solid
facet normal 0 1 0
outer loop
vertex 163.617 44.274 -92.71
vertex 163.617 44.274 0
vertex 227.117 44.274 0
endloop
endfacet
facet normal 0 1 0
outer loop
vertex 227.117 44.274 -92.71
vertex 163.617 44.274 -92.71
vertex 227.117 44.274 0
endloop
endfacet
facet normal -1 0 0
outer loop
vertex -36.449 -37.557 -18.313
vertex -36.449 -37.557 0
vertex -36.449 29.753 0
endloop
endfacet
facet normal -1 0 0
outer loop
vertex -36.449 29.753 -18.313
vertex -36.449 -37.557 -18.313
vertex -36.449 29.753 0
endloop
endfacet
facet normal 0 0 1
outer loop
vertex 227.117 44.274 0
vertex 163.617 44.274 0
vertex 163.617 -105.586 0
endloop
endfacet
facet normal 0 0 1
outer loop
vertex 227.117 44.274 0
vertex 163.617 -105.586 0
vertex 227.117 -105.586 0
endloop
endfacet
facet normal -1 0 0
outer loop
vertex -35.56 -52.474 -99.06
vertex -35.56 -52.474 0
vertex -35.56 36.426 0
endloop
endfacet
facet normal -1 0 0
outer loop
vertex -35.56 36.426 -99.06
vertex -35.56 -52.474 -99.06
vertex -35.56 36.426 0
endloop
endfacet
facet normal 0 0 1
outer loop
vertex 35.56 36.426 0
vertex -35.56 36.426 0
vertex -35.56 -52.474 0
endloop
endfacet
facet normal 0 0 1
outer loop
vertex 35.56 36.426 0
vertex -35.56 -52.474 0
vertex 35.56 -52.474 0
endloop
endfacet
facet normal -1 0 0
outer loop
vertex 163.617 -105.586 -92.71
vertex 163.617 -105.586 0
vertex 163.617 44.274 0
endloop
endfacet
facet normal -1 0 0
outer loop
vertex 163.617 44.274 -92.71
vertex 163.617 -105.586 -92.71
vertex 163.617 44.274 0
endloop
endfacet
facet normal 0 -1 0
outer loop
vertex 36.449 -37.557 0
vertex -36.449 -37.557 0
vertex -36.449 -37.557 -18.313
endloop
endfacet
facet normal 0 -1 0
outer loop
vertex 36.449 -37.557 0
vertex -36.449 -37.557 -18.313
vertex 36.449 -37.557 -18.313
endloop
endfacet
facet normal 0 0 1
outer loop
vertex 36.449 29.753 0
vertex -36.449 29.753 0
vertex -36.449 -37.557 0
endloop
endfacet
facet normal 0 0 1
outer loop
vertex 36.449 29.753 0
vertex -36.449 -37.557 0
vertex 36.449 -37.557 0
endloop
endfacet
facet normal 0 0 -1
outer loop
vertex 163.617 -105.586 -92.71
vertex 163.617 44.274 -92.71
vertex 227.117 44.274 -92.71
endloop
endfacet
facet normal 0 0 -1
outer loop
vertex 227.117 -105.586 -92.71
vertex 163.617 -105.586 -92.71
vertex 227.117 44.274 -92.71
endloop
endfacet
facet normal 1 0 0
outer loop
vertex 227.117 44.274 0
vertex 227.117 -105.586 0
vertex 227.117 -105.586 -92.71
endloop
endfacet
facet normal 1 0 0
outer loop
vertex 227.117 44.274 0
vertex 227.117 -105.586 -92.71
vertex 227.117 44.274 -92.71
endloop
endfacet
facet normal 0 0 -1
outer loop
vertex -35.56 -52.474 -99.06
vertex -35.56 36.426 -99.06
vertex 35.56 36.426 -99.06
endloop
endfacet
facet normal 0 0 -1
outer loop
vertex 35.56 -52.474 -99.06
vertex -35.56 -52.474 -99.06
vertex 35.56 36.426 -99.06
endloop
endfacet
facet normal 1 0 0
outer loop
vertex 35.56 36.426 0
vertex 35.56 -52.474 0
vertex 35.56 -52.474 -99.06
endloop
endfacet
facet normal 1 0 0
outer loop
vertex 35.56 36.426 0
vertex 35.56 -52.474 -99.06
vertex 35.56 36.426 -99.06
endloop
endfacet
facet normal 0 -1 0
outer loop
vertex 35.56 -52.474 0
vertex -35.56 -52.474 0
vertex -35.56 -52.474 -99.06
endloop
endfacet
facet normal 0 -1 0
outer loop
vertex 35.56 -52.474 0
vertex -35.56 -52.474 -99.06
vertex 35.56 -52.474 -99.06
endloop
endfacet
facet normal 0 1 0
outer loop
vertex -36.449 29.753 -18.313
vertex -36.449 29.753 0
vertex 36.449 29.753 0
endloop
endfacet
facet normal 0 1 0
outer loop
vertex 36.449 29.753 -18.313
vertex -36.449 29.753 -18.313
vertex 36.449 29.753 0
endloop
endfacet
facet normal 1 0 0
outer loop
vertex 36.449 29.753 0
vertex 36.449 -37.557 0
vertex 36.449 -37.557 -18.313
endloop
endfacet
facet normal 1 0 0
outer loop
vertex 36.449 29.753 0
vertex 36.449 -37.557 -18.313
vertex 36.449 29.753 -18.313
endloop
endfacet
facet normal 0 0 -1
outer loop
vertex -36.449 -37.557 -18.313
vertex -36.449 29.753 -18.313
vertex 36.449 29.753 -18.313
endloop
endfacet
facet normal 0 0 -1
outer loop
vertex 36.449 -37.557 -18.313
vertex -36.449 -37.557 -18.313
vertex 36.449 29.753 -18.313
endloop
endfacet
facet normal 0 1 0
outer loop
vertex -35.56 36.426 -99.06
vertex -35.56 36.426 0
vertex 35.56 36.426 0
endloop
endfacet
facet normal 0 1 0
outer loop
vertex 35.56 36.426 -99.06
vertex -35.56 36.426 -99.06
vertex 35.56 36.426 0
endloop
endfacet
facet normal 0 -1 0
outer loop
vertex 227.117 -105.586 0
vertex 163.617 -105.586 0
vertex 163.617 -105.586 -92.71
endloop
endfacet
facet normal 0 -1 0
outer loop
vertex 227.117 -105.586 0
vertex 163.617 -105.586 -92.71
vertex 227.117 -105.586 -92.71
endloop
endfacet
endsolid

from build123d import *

# Parameters (mm, degrees)
F0_W     = 72.898
F0_H     = 67.31
F1_DEPTH = 18.3134
F2_W     = 71.12
F2_H     = 88.9
F3_DEPTH = 99.06
F4_W     = 63.5
F4_H     = 149.86
F5_DEPTH = 92.71


with BuildPart() as f1:
    # F0 (on Top) → F1 (new body)
    with BuildSketch(Plane.XY):
        with Locations((0, -3.902208)):
            Rectangle(F0_W, F0_H)
    extrude(amount=-F1_DEPTH)


with BuildPart() as f3:
    # F2 (on Top) → F3 (new body)
    with BuildSketch(Plane.XY):
        with Locations((0, -8.023981)):
            Rectangle(F2_W, F2_H)
    extrude(amount=-F3_DEPTH)


with BuildPart() as f5:
    # F4 (on Top) → F5 (new body)
    with BuildSketch(Plane.XY):
        with Locations((195.366524, -30.655906)):
            Rectangle(F4_W, F4_H)
    extrude(amount=-F5_DEPTH)


solid = Compound([f1.part, f3.part, f5.part])
